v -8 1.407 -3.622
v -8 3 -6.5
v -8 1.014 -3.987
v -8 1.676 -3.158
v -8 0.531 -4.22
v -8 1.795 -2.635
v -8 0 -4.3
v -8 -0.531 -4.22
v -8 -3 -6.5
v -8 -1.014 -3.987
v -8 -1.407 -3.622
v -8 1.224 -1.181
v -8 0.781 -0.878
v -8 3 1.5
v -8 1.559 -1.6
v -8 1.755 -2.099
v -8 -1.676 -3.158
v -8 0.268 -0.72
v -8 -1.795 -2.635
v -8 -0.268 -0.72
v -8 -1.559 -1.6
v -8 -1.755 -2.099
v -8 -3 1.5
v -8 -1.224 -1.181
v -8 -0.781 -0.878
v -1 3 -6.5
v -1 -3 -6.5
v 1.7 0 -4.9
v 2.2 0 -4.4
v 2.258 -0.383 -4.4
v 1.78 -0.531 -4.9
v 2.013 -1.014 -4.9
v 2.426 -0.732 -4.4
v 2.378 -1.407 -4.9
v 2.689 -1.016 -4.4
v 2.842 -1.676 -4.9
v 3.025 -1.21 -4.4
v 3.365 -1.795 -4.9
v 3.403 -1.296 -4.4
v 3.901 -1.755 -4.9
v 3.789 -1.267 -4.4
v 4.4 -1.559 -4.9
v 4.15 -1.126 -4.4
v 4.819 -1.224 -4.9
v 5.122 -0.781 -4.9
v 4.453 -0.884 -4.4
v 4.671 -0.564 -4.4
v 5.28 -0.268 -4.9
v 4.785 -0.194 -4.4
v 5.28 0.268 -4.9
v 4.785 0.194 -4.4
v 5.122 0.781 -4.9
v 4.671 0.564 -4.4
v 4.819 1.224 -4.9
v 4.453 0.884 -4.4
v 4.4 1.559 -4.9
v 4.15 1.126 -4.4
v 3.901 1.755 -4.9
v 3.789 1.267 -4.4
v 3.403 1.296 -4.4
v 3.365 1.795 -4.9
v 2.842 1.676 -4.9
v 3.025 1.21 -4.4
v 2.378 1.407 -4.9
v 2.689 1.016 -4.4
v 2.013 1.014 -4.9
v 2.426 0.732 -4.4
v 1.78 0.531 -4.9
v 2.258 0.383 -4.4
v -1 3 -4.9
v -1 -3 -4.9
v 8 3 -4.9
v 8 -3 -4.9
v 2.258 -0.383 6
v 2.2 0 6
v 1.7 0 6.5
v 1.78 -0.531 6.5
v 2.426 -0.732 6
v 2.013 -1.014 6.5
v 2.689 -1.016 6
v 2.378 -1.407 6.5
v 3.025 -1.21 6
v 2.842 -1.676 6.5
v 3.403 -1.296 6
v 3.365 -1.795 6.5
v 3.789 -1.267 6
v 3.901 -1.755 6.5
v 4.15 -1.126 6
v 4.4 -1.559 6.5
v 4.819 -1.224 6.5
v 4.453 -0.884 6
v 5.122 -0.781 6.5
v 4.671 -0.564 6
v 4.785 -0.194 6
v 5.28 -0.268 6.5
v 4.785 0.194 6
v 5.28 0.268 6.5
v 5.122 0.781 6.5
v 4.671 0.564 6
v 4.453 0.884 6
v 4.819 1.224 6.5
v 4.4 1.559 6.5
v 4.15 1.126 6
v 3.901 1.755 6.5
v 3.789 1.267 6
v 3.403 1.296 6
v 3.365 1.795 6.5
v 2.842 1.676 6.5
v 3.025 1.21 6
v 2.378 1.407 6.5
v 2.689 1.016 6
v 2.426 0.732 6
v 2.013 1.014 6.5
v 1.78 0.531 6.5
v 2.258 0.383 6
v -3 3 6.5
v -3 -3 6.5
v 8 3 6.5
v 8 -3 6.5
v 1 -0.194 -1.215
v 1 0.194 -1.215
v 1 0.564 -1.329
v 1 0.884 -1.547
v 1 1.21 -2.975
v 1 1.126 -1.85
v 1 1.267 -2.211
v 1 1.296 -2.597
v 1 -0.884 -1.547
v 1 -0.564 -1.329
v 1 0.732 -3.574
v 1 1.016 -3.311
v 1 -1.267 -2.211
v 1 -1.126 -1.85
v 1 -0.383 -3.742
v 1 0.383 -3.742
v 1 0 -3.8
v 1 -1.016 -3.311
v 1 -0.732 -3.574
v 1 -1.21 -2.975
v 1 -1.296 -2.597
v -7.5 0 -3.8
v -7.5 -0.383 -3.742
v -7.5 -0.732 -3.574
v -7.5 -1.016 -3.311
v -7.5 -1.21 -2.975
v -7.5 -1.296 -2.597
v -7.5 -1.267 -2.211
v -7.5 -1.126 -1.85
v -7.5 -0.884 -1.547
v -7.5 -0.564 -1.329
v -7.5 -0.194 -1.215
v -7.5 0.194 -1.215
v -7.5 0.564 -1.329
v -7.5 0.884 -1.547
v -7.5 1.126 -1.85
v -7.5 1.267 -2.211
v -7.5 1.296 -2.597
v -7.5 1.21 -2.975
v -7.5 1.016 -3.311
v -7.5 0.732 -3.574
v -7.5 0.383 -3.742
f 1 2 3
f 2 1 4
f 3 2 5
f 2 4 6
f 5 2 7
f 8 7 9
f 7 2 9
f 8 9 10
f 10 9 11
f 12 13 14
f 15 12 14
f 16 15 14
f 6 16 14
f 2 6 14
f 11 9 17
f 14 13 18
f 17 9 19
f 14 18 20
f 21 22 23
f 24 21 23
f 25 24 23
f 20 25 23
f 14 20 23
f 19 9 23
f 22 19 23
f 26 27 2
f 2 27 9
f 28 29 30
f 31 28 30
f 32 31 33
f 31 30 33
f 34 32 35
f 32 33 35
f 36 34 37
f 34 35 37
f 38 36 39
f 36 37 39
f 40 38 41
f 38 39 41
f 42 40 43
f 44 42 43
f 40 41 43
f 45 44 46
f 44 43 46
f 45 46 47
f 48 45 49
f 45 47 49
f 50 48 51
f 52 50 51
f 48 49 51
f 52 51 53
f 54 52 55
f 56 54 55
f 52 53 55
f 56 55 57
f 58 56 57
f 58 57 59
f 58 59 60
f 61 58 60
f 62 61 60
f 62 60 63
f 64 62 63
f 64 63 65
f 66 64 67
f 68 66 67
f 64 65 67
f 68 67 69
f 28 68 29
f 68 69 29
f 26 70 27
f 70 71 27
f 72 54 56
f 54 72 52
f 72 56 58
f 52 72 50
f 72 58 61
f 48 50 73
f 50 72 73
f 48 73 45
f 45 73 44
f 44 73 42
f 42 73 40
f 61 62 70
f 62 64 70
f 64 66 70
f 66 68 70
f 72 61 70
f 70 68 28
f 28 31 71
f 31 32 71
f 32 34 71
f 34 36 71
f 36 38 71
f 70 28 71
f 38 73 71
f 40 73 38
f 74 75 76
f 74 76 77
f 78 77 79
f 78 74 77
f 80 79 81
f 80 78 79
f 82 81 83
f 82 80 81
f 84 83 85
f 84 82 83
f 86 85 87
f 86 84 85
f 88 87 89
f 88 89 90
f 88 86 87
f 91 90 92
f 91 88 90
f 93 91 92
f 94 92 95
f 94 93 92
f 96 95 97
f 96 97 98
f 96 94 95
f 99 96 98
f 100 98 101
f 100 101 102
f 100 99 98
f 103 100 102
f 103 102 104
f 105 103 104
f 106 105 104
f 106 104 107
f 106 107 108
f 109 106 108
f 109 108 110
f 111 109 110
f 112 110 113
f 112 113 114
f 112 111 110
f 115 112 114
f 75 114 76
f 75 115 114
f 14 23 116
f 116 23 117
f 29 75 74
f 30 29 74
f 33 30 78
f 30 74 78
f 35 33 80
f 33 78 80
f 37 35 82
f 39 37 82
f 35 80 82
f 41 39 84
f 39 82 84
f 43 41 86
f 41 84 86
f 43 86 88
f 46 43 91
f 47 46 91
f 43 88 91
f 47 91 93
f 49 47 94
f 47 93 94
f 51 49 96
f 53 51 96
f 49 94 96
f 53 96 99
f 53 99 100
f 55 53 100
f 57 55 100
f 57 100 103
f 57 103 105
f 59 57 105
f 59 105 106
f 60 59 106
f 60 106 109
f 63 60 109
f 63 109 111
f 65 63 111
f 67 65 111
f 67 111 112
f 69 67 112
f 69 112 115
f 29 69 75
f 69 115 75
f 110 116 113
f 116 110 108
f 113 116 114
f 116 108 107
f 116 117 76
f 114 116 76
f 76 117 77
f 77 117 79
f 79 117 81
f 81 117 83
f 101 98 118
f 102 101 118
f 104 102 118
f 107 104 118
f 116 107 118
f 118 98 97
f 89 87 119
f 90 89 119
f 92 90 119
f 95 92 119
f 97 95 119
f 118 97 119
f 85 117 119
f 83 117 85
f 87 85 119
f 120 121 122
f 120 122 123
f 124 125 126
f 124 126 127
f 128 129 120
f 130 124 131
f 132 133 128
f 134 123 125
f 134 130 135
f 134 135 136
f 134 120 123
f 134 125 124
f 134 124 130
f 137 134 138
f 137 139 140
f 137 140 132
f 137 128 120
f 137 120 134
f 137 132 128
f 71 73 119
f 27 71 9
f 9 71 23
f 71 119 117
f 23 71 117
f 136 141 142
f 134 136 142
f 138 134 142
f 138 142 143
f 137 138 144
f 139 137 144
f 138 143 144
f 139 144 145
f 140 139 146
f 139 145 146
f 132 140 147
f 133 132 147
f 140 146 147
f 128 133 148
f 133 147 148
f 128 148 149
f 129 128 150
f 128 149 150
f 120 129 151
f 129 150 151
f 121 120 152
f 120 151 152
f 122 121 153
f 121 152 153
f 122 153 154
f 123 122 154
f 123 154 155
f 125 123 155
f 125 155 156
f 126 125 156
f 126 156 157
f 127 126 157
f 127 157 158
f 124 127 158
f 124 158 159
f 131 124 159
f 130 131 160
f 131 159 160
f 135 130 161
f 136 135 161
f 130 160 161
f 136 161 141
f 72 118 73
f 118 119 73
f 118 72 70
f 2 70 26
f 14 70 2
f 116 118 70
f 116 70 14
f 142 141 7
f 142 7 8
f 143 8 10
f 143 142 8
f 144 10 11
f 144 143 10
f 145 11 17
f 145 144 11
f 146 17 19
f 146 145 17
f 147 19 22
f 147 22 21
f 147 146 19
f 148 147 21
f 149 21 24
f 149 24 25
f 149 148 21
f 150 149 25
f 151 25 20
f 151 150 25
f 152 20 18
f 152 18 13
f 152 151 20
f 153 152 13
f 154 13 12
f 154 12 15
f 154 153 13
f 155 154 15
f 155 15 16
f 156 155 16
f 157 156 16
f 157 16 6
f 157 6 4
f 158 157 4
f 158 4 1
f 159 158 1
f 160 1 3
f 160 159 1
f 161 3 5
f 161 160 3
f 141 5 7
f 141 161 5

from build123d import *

# Parameters (mm, degrees)
PAD_DEPTH       = 3
SKETCH001_R     = 1.3
POCKET_DEPTH    = 11.4
SKETCH002_R     = 1.3
POCKET001_DEPTH = 9
CHAMFER_SIZE    = 0.5


with BuildPart() as part:
    # Sketch → Pad (new body, symmetric)
    with BuildSketch(Plane.XZ):
        Polygon((-8, 1.5), (-3, 6.5), (8, 6.5), (8, -4.9), (-1, -4.9), (-1, -6.5), (-8, -6.5), align=None)
    extrude(amount=PAD_DEPTH, both=True)

    # Sketch001 → Pocket (cut)
    with BuildSketch(Plane(origin=(0, 0, 6.5), x_dir=(-1, 0, 0), z_dir=(0, 0, 1))):
        with Locations((-3.5, 0)):
            Circle(SKETCH001_R)
    extrude(amount=-POCKET_DEPTH, mode=Mode.SUBTRACT)

    # Sketch002 → Pocket001 (cut)
    with BuildSketch(Plane(origin=(-8, 0, 0), x_dir=(0, 0, -1), z_dir=(-1, 0, 0))):
        with Locations((2.5, 0)):
            Circle(SKETCH002_R)
    extrude(amount=-POCKET001_DEPTH, mode=Mode.SUBTRACT)

    # Chamfer
    chamfer_edges = [part.edges().sort_by_distance(p)[0] for p in [
        (-8, 0, -1.2),
        (4.8, 0, 6.5),
        (4.8, 0, -4.9),
    ]]
    chamfer(chamfer_edges, length=CHAMFER_SIZE)


solid = part.part
